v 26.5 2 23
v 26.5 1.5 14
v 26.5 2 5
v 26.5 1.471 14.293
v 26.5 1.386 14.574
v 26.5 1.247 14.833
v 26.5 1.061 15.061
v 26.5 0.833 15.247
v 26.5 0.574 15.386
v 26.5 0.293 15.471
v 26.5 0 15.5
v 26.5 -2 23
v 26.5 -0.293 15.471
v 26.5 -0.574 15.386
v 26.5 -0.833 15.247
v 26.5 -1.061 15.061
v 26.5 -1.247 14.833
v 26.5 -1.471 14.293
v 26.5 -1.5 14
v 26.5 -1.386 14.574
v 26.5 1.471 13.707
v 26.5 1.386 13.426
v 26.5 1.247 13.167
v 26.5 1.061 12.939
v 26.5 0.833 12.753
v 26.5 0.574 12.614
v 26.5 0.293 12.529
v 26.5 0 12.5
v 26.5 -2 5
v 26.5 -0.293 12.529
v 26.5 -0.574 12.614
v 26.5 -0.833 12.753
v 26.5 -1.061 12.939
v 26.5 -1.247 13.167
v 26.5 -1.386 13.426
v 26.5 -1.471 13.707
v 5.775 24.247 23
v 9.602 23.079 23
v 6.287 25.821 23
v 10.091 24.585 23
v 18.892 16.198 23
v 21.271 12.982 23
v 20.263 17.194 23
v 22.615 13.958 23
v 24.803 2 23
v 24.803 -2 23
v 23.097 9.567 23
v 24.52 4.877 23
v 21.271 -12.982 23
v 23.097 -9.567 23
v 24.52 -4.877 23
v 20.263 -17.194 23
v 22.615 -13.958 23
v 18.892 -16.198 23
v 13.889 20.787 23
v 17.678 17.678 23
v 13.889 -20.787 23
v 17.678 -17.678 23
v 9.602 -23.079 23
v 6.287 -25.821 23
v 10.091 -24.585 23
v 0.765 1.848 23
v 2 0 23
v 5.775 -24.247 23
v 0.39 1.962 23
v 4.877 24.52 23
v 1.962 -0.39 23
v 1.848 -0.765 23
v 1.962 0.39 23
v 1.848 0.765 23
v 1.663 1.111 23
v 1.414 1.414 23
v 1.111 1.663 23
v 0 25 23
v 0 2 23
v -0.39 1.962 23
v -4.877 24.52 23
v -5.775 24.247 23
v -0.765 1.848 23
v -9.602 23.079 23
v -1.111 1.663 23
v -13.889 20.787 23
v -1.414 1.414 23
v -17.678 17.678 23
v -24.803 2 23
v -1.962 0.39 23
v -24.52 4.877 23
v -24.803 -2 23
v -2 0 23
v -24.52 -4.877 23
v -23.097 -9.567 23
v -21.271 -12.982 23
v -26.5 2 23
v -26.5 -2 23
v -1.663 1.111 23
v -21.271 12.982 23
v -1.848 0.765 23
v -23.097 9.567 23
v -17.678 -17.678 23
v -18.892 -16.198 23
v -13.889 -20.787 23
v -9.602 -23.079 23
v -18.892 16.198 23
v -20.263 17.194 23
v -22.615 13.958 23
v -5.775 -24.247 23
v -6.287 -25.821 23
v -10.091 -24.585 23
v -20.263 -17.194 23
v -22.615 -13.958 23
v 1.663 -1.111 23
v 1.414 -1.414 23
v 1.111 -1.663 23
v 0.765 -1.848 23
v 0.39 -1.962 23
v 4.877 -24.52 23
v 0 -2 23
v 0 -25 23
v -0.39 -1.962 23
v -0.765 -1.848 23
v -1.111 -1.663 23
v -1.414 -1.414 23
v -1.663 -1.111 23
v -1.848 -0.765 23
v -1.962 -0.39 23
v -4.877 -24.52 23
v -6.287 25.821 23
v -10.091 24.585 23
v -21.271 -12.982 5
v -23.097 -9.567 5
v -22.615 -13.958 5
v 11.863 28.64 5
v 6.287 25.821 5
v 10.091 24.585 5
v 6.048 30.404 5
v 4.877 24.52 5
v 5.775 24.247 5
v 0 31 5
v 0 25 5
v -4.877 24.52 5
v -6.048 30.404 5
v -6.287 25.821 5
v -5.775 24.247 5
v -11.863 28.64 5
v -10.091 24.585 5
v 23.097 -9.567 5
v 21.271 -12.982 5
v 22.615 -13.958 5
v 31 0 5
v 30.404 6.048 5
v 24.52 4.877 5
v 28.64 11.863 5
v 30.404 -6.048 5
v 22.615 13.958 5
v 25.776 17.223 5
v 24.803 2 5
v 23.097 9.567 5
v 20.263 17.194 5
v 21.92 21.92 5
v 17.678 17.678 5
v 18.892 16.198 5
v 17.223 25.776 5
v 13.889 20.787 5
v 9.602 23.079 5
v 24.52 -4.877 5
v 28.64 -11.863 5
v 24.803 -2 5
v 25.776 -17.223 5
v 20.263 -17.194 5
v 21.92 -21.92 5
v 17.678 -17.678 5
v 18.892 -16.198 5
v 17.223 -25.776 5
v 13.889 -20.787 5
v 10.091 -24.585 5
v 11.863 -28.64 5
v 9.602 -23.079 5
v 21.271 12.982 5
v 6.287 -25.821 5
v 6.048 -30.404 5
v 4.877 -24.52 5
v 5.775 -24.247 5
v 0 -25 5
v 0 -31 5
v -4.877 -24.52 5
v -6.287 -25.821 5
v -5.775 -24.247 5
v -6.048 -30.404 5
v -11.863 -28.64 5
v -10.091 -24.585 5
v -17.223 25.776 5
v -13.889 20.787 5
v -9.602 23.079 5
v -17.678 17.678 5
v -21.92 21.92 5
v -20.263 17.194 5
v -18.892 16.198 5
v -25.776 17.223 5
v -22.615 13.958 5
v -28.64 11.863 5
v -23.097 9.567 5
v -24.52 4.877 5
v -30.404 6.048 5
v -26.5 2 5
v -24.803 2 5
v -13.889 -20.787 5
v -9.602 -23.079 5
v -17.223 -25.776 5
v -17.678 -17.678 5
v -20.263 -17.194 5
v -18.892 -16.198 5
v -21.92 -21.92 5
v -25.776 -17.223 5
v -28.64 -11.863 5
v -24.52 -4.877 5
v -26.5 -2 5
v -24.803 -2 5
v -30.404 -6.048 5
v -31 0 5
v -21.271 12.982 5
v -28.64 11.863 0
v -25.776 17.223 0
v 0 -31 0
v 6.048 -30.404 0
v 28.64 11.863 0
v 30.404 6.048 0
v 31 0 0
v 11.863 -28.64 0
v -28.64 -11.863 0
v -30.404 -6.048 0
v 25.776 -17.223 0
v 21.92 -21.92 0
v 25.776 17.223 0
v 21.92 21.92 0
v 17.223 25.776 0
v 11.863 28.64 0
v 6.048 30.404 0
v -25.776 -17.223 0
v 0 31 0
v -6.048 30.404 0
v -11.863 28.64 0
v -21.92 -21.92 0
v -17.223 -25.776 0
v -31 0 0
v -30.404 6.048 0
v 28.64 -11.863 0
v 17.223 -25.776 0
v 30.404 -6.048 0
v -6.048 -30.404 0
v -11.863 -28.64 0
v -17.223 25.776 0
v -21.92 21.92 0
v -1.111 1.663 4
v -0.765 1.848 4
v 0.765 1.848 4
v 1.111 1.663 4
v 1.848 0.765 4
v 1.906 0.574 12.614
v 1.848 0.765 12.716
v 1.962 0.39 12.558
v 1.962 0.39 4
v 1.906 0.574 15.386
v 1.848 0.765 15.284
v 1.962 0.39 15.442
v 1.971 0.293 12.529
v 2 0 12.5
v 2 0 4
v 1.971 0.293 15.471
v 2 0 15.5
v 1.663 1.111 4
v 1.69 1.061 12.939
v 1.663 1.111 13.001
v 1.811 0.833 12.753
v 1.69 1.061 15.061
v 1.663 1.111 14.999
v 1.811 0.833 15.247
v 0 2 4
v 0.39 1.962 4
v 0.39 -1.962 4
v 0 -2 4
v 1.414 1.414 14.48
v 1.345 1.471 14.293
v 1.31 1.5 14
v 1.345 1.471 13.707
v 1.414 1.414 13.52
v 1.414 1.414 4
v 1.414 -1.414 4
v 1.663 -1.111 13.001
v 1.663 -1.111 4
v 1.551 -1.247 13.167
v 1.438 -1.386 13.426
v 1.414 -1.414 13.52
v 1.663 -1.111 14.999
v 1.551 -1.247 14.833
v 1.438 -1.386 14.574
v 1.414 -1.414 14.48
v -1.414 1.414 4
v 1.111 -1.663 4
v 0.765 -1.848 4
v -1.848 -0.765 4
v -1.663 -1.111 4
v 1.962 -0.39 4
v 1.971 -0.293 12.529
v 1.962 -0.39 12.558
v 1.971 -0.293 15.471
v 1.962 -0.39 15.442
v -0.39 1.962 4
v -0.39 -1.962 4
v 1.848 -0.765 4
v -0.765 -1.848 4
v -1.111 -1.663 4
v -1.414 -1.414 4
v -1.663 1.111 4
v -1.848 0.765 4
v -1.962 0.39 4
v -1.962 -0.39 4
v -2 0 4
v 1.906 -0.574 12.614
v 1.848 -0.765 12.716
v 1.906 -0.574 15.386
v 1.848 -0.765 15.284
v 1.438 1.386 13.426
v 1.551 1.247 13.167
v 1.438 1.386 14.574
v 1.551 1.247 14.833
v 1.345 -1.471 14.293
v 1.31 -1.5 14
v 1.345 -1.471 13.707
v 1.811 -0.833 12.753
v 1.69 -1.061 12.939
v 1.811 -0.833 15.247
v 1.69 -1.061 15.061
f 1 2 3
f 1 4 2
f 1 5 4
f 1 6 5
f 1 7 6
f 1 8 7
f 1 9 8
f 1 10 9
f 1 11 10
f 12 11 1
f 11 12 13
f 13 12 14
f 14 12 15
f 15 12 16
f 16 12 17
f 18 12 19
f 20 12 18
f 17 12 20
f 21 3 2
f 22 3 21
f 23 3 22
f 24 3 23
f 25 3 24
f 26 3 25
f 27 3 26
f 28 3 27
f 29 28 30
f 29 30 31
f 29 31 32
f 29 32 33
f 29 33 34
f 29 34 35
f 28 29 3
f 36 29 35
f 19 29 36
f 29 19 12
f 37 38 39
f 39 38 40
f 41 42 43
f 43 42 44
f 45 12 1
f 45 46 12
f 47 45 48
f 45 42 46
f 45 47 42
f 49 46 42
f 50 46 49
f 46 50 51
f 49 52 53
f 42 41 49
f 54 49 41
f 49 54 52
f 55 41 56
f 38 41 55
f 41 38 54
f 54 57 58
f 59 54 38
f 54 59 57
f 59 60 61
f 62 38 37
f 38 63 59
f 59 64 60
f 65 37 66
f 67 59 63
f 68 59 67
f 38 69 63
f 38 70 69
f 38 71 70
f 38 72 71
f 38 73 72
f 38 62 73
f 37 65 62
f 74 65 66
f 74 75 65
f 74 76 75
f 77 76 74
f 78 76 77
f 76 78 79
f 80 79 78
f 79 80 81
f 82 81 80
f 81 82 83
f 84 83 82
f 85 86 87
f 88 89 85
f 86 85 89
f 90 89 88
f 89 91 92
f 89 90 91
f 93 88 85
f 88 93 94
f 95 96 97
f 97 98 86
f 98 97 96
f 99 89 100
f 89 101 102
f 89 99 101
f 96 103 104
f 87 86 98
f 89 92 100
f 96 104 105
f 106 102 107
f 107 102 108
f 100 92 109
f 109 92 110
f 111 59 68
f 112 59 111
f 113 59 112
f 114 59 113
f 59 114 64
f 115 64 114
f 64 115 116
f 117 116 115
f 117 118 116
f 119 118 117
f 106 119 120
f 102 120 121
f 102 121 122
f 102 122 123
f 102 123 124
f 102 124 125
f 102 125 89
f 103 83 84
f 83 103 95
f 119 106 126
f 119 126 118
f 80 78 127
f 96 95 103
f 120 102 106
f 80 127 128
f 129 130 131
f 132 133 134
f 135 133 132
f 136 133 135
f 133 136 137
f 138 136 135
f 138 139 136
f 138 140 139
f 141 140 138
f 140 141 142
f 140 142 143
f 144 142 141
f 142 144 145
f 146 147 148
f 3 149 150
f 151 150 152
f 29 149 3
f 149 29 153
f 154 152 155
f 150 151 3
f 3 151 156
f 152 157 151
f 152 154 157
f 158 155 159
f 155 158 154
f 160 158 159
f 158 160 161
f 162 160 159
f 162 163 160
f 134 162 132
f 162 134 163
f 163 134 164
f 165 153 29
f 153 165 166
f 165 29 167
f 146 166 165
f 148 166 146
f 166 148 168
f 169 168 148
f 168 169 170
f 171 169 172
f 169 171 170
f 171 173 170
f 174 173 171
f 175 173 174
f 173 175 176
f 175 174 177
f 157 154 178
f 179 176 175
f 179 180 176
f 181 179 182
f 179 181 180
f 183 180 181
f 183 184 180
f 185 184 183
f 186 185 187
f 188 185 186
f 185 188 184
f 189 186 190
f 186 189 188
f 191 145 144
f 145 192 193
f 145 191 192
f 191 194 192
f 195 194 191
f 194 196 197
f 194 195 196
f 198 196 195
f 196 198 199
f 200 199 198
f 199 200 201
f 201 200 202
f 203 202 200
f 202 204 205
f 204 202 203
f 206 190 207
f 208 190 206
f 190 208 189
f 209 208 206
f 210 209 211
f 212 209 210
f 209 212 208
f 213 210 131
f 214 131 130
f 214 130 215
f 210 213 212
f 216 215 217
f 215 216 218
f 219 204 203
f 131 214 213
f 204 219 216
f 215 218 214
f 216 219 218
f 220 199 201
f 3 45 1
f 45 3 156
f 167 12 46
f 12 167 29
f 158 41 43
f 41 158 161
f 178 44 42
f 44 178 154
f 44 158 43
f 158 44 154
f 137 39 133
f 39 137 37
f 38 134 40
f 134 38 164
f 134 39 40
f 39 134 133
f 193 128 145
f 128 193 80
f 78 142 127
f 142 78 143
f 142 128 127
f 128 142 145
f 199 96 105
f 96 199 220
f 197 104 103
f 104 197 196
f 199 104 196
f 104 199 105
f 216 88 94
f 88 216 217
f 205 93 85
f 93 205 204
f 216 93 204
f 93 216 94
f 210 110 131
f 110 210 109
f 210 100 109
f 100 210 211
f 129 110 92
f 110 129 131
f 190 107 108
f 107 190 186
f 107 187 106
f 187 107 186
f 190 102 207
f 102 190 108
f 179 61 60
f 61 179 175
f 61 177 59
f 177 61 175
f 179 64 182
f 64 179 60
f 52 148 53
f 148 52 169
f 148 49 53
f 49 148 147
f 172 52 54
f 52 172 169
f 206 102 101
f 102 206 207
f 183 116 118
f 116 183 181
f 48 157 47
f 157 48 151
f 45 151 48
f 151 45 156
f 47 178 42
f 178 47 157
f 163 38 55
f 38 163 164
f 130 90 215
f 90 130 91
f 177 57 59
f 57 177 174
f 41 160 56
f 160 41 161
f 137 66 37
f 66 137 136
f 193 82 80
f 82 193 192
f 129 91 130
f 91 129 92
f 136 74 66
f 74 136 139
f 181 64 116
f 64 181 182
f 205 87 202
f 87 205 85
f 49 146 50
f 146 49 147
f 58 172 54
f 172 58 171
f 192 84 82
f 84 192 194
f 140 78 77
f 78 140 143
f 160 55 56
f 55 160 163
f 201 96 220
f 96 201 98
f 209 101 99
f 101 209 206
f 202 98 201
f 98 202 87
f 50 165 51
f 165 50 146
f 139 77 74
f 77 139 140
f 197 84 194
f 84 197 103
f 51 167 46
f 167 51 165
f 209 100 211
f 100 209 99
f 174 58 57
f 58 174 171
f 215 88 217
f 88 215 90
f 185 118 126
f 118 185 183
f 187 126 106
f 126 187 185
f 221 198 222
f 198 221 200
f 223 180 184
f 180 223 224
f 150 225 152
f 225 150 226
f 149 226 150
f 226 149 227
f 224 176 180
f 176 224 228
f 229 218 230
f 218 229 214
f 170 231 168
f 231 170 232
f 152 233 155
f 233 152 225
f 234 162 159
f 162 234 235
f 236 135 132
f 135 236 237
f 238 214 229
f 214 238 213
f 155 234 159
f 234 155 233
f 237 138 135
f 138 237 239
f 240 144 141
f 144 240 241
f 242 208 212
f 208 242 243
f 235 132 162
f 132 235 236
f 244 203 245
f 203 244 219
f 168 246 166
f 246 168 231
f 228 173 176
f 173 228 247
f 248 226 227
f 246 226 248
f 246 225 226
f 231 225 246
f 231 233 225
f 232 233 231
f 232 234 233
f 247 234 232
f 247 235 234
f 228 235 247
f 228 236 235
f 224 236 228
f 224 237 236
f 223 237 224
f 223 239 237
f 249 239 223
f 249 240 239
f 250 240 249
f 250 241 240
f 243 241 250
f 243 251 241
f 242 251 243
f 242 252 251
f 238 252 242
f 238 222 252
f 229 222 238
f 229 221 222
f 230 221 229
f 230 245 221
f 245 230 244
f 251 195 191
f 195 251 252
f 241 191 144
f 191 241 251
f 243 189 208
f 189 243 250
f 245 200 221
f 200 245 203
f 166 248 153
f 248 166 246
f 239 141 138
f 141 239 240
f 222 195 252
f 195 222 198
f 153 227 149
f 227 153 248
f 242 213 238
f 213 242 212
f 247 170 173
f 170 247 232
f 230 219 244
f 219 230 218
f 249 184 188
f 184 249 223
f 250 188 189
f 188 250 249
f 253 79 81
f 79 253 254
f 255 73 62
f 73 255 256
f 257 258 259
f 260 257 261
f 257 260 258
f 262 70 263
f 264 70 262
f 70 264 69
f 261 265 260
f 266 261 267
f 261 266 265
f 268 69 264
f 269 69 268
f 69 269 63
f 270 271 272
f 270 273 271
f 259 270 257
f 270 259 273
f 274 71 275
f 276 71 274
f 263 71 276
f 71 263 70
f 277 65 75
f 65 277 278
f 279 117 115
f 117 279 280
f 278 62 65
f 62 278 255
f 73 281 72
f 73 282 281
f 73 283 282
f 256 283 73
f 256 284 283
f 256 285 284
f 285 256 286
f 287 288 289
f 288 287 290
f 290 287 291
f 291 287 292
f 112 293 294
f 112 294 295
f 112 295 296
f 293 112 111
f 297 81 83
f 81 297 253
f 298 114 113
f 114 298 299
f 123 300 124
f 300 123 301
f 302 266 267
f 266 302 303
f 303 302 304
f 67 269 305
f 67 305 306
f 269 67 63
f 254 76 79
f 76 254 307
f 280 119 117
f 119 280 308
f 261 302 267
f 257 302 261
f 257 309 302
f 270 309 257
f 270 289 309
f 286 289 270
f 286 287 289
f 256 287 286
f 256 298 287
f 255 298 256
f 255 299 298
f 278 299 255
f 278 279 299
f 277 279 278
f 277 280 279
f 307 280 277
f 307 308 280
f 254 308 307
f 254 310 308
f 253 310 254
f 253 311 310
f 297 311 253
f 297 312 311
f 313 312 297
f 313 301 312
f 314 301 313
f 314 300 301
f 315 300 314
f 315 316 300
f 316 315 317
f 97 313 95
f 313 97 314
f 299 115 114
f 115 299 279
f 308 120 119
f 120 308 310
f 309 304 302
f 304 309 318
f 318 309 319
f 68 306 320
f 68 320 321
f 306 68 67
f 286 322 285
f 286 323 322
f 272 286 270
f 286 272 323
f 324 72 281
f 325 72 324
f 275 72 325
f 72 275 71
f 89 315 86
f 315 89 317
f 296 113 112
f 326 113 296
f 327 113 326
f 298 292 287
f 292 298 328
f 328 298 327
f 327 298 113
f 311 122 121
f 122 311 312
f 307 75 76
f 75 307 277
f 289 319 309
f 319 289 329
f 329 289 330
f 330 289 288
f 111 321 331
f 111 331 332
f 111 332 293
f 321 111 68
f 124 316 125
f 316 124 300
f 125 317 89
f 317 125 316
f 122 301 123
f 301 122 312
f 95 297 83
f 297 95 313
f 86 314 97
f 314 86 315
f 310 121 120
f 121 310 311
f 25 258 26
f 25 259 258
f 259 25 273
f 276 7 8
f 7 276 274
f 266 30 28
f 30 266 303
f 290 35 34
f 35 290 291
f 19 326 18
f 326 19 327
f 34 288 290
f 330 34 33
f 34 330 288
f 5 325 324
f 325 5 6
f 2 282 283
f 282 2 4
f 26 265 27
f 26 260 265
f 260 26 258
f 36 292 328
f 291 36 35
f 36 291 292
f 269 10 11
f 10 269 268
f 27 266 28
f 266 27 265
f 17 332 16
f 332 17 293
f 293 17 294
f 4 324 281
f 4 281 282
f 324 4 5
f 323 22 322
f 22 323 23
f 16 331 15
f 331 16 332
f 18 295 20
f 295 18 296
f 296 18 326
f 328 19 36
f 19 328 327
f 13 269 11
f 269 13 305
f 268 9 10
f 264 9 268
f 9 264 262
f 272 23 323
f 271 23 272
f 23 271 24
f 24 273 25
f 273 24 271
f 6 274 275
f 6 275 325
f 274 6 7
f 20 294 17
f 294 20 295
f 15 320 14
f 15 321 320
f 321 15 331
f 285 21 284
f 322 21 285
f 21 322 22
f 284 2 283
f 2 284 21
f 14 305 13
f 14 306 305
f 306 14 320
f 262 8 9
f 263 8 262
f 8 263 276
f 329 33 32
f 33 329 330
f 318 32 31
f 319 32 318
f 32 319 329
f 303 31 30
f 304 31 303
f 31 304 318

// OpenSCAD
$fn = 32;

// ----------------------------------------------------------------------
// Control knob: skirt knob with grip ribs
// ----------------------------------------------------------------------

// --- parameters (mm) ---
skirt_d = 62;             // skirt diameter
skirt_t = 5;              // skirt thickness
rib_w = 4;                // grip rib width
rib_out = 2.5;            // grip rib radial protrusion
n_ribs = 10;              // number of grip ribs
knob_d = 50;              // knob body diameter
knob_h = 18;              // knob body height
bore_d = 4;               // shaft bore diameter
set_d = 3;                // set screw bore diameter

rib_step = 360 / n_ribs;  // rib angular step
total_h = skirt_t + knob_h;  // overall height

difference() {
  union() {
    translate([0, 0, skirt_t]) cylinder(h = knob_h, d = knob_d);
    cylinder(h = skirt_t, d = skirt_d);
    for (i = [0 : n_ribs - 1])
      rotate([0, 0, i * rib_step])
        translate([knob_d / 2 - 1, -rib_w / 2, skirt_t])
          cube([rib_out, rib_w, knob_h]);
  }
  translate([0, 0, skirt_t - 1]) cylinder(h = knob_h + 2, d = bore_d);
  translate([-1, 0, skirt_t + knob_h / 2]) rotate([0, 90, 0])
    cylinder(h = knob_d / 2 + bore_d / 2 + 2, d = set_d);
}
